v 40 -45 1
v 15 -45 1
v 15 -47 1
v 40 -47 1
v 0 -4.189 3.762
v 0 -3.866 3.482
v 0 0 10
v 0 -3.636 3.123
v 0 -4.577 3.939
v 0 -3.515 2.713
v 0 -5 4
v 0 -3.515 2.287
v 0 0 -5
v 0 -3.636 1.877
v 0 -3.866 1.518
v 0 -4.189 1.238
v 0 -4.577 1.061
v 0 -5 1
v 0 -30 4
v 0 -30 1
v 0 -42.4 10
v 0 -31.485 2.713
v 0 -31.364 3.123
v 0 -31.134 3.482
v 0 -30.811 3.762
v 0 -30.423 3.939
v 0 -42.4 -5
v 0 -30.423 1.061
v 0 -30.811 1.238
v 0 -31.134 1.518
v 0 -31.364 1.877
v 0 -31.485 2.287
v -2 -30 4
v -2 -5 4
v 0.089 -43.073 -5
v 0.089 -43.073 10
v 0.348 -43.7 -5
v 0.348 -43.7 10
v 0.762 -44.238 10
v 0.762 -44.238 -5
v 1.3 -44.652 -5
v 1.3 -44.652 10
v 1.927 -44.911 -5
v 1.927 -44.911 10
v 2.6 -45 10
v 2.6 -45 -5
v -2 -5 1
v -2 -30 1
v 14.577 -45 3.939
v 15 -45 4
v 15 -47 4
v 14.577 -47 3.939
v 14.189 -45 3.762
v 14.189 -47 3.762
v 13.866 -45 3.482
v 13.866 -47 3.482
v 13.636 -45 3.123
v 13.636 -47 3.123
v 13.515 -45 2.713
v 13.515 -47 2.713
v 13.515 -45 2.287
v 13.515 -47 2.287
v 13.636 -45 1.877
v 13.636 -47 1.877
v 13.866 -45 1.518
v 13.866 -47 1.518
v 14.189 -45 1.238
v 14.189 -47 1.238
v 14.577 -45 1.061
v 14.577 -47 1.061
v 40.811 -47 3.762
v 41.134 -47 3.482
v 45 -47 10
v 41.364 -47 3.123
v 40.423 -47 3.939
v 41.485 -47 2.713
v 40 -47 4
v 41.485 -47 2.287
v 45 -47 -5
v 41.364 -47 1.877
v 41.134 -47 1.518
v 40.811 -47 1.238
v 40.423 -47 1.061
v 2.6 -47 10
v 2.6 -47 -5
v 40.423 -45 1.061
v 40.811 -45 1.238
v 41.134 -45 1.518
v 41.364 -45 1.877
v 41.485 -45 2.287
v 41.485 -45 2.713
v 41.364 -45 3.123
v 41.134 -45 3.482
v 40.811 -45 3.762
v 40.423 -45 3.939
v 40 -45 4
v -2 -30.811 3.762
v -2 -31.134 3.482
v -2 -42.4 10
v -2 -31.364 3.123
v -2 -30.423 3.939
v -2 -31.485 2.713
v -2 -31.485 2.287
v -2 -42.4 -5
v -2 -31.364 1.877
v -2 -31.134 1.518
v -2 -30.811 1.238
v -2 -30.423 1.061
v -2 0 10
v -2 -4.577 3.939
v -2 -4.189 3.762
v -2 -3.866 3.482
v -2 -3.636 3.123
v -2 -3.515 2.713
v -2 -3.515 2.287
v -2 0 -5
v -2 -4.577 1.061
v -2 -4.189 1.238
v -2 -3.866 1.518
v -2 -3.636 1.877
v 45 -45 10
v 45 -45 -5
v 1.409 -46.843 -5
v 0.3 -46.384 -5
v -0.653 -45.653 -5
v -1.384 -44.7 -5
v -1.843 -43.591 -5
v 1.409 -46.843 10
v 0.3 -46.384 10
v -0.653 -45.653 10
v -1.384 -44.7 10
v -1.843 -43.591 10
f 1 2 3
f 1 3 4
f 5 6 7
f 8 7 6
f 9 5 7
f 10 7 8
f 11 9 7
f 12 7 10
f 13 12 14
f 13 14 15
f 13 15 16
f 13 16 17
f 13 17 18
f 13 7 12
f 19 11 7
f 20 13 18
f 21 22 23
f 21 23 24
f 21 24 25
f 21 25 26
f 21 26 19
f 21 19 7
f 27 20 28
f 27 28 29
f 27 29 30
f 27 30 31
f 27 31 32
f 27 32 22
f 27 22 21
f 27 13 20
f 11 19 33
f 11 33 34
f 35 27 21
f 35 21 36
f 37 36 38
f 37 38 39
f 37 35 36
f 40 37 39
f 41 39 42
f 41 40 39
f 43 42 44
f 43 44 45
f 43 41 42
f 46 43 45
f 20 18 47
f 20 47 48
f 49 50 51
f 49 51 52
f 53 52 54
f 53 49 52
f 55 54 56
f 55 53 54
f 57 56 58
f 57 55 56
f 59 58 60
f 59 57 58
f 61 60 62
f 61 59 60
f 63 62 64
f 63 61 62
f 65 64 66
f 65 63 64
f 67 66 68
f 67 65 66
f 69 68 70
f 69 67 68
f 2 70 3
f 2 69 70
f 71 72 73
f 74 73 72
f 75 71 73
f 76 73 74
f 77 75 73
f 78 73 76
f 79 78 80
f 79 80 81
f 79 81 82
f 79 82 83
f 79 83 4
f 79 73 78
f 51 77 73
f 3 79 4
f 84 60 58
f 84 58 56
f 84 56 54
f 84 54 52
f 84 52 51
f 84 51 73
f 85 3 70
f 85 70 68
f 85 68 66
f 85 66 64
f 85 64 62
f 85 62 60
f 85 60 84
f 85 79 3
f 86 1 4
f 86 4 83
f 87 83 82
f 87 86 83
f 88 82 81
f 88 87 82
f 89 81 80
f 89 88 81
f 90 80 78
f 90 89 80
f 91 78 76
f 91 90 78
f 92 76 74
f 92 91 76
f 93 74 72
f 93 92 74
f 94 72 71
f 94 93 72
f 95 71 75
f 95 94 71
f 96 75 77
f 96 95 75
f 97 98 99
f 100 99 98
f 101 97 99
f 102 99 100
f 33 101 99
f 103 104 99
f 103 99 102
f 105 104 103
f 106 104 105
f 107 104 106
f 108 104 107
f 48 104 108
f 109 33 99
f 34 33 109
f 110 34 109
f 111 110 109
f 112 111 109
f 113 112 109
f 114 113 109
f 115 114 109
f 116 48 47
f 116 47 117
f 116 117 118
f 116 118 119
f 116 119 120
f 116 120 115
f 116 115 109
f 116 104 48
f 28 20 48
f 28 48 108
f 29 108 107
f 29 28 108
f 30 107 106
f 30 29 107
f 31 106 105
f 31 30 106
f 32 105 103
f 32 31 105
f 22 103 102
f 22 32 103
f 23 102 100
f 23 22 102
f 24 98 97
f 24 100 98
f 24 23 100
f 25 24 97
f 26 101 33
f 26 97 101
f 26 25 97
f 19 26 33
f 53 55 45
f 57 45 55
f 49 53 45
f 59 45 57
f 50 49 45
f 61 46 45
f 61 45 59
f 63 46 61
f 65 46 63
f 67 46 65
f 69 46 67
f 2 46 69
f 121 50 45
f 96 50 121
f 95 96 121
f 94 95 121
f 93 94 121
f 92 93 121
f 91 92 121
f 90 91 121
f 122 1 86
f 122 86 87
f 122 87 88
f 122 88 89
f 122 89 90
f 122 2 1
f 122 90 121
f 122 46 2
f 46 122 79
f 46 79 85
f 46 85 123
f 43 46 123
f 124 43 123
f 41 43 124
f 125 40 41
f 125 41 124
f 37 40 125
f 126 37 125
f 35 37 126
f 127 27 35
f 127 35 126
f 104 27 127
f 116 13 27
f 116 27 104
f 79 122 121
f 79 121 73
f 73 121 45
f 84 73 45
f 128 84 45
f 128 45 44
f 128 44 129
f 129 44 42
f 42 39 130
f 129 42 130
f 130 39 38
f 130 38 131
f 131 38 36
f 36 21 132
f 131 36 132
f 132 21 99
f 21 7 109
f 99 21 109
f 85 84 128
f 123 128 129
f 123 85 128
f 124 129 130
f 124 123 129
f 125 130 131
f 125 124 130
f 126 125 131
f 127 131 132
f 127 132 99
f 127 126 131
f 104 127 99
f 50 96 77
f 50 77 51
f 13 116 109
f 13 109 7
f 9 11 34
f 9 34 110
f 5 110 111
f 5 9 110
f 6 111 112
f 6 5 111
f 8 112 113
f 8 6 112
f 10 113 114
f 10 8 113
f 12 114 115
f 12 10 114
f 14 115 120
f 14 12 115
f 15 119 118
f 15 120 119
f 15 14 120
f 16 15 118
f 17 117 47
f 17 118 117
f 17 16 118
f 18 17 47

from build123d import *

# Parameters (mm, degrees)
BASE_FLANGE1_DEPTH      = 10
BASE_FLANGE1_DEPTH_BACK = 5
CUT_EXTRUDE1_DEPTH      = 10
CUT_EXTRUDE2_DEPTH      = 10


# Sheet-metal steps are written as plain solids
with BuildPart() as part:
    # Sketch1 → Base-Flange1 (new, two sides: drawn at the far end of the back side and taken through both)
    with BuildSketch(Plane.XY.offset(-BASE_FLANGE1_DEPTH_BACK)):
        with BuildLine():
            Line((0, 0), (0, -42.4))
            ThreePointArc((0, -42.4), (0.761522369, -44.238477631), (2.6, -45))
            Line((2.6, -45), (45, -45))
            Line((45, -45), (45, -47))
            Line((45, -47), (2.6, -47))
            ThreePointArc((2.6, -47), (-0.652691193, -45.652691193), (-2, -42.4))
            Line((-2, -42.4), (-2, 0))
            Line((-2, 0), (0, 0))
        make_face()
    extrude(amount=BASE_FLANGE1_DEPTH + BASE_FLANGE1_DEPTH_BACK)

    # Sketch6 → Cut-Extrude1 (cut)
    with BuildSketch(Plane(origin=(0, 0, 0), x_dir=(0, 0, -1), z_dir=(1, 0, 0))):
        with BuildLine():
            Line((-1, -5), (-1, -30))
            ThreePointArc((-1, -30), (-2.5, -31.5), (-4, -30))
            Line((-4, -30), (-4, -5))
            ThreePointArc((-4, -5), (-2.5, -3.5), (-1, -5))
        make_face()
    extrude(amount=-CUT_EXTRUDE1_DEPTH, mode=Mode.SUBTRACT)

    # Sketch7 → Cut-Extrude2 (cut)
    with BuildSketch(Plane(origin=(0, -45, 0), x_dir=(1, 0, 0), z_dir=(0, 1, 0))):
        with BuildLine():
            Line((40, -4), (15, -4))
            ThreePointArc((15, -4), (13.5, -2.5), (15, -1))
            Line((15, -1), (40, -1))
            ThreePointArc((40, -1), (41.5, -2.5), (40, -4))
        make_face()
    extrude(amount=-CUT_EXTRUDE2_DEPTH, mode=Mode.SUBTRACT)


solid = part.part
